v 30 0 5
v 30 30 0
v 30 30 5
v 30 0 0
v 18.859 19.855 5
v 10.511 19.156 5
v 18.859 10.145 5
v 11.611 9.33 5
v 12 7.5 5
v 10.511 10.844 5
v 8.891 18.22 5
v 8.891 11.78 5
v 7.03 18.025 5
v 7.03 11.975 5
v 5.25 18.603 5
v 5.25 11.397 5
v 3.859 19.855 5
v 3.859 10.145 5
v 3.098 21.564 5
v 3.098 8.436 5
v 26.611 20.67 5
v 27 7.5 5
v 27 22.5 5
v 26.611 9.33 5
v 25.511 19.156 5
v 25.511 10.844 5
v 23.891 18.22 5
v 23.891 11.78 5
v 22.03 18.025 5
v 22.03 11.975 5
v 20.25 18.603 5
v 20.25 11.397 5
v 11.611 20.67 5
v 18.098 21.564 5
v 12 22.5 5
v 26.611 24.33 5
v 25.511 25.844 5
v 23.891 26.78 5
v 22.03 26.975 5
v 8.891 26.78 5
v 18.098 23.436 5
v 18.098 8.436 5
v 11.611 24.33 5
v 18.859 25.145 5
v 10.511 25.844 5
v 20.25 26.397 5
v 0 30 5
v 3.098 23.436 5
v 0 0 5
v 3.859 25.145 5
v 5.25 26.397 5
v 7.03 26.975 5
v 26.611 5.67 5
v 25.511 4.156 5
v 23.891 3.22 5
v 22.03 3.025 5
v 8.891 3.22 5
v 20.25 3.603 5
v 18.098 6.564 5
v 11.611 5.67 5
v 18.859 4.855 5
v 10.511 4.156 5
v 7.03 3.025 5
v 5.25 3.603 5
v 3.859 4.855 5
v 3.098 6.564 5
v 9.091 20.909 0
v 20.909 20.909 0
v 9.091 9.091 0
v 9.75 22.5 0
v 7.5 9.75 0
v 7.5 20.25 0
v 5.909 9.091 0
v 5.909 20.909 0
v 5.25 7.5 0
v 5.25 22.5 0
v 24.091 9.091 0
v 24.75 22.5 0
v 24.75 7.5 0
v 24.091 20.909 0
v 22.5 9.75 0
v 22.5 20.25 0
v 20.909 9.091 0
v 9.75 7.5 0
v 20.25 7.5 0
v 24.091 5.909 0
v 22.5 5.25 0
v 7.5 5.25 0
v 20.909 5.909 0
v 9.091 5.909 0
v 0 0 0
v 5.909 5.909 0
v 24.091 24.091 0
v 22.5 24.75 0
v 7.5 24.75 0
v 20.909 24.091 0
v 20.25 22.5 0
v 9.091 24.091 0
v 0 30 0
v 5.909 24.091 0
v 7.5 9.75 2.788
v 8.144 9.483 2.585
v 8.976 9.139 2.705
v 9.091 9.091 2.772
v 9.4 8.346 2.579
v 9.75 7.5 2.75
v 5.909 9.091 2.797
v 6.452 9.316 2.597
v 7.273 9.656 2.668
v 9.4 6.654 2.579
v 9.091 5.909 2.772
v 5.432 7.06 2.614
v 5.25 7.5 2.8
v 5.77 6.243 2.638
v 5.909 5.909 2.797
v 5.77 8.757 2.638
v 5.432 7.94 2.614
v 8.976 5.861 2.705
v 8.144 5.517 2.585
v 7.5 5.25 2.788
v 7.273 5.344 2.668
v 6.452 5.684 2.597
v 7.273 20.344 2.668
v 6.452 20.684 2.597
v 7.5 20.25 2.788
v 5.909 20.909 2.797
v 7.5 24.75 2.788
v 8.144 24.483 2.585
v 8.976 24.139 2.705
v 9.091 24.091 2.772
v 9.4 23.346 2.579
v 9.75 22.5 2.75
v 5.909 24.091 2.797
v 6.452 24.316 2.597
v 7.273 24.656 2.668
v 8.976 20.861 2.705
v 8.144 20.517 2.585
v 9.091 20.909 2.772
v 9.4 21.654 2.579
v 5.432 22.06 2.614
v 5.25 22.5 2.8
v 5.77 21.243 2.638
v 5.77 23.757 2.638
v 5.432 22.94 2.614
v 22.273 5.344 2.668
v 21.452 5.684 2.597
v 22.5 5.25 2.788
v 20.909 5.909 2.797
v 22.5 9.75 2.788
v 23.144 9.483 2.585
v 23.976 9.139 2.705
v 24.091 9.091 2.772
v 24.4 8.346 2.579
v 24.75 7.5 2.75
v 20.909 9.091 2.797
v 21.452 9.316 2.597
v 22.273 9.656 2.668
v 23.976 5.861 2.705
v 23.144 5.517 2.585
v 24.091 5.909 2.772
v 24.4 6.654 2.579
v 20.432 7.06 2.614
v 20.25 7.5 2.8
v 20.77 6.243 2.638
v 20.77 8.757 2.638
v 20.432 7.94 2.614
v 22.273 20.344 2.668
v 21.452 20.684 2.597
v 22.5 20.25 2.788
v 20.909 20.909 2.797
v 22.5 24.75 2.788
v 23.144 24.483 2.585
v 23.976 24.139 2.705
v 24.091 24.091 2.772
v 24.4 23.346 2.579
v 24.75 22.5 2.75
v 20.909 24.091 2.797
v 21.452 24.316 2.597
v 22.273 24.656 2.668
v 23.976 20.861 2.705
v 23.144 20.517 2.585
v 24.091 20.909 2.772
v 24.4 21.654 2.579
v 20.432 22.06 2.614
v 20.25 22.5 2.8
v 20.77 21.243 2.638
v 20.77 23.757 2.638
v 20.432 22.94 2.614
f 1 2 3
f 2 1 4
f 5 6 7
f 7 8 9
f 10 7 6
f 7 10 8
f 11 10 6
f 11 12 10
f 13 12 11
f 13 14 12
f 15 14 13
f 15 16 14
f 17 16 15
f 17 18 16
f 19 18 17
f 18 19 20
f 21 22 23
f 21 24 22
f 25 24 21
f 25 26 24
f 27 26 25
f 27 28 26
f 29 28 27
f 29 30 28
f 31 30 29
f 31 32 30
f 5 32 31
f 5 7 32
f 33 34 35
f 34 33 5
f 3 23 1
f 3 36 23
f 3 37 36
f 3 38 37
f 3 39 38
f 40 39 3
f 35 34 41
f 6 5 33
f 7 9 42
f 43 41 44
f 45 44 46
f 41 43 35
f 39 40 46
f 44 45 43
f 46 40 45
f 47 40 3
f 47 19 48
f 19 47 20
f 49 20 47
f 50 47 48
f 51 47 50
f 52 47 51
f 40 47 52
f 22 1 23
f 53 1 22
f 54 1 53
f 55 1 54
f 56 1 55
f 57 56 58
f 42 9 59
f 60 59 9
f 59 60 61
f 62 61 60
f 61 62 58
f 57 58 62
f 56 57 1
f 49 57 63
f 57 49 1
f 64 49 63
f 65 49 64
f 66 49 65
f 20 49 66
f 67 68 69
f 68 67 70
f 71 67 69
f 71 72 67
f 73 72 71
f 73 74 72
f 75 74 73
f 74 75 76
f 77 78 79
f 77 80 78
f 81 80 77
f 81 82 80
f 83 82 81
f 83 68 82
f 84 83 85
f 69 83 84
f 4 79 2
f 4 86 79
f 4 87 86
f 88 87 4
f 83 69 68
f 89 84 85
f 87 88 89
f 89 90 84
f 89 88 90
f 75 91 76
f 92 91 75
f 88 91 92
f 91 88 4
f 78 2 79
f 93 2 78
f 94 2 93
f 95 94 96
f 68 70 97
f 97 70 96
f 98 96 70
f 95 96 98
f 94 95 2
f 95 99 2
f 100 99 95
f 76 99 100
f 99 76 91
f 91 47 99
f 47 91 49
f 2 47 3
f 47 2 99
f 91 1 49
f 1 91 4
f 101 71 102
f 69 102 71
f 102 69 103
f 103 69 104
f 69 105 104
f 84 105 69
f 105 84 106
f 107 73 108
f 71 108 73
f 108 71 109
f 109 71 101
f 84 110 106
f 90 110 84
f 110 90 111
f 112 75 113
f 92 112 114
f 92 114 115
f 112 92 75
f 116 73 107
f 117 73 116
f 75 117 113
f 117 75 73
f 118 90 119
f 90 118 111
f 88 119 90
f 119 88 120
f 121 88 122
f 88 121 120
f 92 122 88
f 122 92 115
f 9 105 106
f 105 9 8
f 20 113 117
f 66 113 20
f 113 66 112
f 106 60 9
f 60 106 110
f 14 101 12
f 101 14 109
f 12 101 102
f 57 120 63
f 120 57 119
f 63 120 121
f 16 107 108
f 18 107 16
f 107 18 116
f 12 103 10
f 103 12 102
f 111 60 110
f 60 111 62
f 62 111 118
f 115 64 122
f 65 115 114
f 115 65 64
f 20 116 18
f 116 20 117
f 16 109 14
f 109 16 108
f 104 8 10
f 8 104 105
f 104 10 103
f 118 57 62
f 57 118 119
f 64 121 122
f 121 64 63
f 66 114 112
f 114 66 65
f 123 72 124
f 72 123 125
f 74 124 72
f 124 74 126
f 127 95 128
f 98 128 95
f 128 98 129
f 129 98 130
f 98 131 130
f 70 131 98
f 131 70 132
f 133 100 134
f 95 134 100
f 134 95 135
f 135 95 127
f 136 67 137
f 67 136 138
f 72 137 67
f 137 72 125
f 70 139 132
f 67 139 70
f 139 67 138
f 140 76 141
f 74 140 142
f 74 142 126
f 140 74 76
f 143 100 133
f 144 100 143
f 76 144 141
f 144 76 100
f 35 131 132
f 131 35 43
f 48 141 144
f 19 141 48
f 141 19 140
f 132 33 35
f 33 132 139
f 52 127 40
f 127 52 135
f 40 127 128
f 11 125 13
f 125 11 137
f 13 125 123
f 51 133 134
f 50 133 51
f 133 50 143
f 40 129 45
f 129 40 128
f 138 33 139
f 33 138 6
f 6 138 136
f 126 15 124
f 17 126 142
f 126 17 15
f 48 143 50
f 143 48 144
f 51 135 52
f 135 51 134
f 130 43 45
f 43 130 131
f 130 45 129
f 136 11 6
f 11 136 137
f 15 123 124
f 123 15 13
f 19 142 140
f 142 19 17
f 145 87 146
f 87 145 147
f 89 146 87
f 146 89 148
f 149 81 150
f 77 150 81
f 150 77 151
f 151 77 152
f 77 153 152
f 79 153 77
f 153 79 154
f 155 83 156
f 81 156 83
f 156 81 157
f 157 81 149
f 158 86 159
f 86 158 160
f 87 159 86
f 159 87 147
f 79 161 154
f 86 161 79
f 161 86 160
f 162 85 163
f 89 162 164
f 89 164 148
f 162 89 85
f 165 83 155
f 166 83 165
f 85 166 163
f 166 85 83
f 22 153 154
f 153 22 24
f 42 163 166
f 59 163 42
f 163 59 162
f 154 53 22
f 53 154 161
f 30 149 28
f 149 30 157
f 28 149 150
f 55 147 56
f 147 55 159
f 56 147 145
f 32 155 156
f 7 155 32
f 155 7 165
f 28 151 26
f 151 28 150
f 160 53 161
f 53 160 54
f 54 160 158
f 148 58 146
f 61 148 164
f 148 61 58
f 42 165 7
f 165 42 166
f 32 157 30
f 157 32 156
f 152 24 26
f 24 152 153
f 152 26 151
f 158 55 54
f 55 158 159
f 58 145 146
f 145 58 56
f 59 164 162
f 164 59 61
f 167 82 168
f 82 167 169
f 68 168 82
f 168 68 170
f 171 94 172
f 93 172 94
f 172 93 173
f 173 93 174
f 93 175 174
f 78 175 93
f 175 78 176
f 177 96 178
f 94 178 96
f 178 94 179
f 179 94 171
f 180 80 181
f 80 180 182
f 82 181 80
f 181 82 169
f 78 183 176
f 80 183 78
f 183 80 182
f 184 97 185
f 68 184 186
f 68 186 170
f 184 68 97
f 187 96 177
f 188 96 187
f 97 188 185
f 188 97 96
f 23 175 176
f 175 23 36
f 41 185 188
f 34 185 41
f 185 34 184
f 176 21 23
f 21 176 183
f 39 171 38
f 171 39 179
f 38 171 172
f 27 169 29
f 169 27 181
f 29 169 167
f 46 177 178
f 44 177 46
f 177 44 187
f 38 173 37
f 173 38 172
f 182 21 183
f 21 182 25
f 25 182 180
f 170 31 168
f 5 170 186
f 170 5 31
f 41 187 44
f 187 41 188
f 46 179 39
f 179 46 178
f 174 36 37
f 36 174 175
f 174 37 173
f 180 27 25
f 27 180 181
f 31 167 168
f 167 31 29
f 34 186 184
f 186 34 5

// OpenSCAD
// The exact-geometry audit's case c06 (docs/audits/exact-geometry-rust.md).
// volume: 3991.0619901184537
difference() {
  cube([30, 30, 5]);
  translate([7.5, 7.5, -1]) cylinder(r=2.25, h=7);
  translate([7.5, 7.5, 0.5]) cylinder(r1=0, r2=4.51, h=4.51);
  translate([7.5, 22.5, -1]) cylinder(r=2.25, h=7);
  translate([7.5, 22.5, 0.5]) cylinder(r1=0, r2=4.51, h=4.51);
  translate([22.5, 7.5, -1]) cylinder(r=2.25, h=7);
  translate([22.5, 7.5, 0.5]) cylinder(r1=0, r2=4.51, h=4.51);
  translate([22.5, 22.5, -1]) cylinder(r=2.25, h=7);
  translate([22.5, 22.5, 0.5]) cylinder(r1=0, r2=4.51, h=4.51);
}
